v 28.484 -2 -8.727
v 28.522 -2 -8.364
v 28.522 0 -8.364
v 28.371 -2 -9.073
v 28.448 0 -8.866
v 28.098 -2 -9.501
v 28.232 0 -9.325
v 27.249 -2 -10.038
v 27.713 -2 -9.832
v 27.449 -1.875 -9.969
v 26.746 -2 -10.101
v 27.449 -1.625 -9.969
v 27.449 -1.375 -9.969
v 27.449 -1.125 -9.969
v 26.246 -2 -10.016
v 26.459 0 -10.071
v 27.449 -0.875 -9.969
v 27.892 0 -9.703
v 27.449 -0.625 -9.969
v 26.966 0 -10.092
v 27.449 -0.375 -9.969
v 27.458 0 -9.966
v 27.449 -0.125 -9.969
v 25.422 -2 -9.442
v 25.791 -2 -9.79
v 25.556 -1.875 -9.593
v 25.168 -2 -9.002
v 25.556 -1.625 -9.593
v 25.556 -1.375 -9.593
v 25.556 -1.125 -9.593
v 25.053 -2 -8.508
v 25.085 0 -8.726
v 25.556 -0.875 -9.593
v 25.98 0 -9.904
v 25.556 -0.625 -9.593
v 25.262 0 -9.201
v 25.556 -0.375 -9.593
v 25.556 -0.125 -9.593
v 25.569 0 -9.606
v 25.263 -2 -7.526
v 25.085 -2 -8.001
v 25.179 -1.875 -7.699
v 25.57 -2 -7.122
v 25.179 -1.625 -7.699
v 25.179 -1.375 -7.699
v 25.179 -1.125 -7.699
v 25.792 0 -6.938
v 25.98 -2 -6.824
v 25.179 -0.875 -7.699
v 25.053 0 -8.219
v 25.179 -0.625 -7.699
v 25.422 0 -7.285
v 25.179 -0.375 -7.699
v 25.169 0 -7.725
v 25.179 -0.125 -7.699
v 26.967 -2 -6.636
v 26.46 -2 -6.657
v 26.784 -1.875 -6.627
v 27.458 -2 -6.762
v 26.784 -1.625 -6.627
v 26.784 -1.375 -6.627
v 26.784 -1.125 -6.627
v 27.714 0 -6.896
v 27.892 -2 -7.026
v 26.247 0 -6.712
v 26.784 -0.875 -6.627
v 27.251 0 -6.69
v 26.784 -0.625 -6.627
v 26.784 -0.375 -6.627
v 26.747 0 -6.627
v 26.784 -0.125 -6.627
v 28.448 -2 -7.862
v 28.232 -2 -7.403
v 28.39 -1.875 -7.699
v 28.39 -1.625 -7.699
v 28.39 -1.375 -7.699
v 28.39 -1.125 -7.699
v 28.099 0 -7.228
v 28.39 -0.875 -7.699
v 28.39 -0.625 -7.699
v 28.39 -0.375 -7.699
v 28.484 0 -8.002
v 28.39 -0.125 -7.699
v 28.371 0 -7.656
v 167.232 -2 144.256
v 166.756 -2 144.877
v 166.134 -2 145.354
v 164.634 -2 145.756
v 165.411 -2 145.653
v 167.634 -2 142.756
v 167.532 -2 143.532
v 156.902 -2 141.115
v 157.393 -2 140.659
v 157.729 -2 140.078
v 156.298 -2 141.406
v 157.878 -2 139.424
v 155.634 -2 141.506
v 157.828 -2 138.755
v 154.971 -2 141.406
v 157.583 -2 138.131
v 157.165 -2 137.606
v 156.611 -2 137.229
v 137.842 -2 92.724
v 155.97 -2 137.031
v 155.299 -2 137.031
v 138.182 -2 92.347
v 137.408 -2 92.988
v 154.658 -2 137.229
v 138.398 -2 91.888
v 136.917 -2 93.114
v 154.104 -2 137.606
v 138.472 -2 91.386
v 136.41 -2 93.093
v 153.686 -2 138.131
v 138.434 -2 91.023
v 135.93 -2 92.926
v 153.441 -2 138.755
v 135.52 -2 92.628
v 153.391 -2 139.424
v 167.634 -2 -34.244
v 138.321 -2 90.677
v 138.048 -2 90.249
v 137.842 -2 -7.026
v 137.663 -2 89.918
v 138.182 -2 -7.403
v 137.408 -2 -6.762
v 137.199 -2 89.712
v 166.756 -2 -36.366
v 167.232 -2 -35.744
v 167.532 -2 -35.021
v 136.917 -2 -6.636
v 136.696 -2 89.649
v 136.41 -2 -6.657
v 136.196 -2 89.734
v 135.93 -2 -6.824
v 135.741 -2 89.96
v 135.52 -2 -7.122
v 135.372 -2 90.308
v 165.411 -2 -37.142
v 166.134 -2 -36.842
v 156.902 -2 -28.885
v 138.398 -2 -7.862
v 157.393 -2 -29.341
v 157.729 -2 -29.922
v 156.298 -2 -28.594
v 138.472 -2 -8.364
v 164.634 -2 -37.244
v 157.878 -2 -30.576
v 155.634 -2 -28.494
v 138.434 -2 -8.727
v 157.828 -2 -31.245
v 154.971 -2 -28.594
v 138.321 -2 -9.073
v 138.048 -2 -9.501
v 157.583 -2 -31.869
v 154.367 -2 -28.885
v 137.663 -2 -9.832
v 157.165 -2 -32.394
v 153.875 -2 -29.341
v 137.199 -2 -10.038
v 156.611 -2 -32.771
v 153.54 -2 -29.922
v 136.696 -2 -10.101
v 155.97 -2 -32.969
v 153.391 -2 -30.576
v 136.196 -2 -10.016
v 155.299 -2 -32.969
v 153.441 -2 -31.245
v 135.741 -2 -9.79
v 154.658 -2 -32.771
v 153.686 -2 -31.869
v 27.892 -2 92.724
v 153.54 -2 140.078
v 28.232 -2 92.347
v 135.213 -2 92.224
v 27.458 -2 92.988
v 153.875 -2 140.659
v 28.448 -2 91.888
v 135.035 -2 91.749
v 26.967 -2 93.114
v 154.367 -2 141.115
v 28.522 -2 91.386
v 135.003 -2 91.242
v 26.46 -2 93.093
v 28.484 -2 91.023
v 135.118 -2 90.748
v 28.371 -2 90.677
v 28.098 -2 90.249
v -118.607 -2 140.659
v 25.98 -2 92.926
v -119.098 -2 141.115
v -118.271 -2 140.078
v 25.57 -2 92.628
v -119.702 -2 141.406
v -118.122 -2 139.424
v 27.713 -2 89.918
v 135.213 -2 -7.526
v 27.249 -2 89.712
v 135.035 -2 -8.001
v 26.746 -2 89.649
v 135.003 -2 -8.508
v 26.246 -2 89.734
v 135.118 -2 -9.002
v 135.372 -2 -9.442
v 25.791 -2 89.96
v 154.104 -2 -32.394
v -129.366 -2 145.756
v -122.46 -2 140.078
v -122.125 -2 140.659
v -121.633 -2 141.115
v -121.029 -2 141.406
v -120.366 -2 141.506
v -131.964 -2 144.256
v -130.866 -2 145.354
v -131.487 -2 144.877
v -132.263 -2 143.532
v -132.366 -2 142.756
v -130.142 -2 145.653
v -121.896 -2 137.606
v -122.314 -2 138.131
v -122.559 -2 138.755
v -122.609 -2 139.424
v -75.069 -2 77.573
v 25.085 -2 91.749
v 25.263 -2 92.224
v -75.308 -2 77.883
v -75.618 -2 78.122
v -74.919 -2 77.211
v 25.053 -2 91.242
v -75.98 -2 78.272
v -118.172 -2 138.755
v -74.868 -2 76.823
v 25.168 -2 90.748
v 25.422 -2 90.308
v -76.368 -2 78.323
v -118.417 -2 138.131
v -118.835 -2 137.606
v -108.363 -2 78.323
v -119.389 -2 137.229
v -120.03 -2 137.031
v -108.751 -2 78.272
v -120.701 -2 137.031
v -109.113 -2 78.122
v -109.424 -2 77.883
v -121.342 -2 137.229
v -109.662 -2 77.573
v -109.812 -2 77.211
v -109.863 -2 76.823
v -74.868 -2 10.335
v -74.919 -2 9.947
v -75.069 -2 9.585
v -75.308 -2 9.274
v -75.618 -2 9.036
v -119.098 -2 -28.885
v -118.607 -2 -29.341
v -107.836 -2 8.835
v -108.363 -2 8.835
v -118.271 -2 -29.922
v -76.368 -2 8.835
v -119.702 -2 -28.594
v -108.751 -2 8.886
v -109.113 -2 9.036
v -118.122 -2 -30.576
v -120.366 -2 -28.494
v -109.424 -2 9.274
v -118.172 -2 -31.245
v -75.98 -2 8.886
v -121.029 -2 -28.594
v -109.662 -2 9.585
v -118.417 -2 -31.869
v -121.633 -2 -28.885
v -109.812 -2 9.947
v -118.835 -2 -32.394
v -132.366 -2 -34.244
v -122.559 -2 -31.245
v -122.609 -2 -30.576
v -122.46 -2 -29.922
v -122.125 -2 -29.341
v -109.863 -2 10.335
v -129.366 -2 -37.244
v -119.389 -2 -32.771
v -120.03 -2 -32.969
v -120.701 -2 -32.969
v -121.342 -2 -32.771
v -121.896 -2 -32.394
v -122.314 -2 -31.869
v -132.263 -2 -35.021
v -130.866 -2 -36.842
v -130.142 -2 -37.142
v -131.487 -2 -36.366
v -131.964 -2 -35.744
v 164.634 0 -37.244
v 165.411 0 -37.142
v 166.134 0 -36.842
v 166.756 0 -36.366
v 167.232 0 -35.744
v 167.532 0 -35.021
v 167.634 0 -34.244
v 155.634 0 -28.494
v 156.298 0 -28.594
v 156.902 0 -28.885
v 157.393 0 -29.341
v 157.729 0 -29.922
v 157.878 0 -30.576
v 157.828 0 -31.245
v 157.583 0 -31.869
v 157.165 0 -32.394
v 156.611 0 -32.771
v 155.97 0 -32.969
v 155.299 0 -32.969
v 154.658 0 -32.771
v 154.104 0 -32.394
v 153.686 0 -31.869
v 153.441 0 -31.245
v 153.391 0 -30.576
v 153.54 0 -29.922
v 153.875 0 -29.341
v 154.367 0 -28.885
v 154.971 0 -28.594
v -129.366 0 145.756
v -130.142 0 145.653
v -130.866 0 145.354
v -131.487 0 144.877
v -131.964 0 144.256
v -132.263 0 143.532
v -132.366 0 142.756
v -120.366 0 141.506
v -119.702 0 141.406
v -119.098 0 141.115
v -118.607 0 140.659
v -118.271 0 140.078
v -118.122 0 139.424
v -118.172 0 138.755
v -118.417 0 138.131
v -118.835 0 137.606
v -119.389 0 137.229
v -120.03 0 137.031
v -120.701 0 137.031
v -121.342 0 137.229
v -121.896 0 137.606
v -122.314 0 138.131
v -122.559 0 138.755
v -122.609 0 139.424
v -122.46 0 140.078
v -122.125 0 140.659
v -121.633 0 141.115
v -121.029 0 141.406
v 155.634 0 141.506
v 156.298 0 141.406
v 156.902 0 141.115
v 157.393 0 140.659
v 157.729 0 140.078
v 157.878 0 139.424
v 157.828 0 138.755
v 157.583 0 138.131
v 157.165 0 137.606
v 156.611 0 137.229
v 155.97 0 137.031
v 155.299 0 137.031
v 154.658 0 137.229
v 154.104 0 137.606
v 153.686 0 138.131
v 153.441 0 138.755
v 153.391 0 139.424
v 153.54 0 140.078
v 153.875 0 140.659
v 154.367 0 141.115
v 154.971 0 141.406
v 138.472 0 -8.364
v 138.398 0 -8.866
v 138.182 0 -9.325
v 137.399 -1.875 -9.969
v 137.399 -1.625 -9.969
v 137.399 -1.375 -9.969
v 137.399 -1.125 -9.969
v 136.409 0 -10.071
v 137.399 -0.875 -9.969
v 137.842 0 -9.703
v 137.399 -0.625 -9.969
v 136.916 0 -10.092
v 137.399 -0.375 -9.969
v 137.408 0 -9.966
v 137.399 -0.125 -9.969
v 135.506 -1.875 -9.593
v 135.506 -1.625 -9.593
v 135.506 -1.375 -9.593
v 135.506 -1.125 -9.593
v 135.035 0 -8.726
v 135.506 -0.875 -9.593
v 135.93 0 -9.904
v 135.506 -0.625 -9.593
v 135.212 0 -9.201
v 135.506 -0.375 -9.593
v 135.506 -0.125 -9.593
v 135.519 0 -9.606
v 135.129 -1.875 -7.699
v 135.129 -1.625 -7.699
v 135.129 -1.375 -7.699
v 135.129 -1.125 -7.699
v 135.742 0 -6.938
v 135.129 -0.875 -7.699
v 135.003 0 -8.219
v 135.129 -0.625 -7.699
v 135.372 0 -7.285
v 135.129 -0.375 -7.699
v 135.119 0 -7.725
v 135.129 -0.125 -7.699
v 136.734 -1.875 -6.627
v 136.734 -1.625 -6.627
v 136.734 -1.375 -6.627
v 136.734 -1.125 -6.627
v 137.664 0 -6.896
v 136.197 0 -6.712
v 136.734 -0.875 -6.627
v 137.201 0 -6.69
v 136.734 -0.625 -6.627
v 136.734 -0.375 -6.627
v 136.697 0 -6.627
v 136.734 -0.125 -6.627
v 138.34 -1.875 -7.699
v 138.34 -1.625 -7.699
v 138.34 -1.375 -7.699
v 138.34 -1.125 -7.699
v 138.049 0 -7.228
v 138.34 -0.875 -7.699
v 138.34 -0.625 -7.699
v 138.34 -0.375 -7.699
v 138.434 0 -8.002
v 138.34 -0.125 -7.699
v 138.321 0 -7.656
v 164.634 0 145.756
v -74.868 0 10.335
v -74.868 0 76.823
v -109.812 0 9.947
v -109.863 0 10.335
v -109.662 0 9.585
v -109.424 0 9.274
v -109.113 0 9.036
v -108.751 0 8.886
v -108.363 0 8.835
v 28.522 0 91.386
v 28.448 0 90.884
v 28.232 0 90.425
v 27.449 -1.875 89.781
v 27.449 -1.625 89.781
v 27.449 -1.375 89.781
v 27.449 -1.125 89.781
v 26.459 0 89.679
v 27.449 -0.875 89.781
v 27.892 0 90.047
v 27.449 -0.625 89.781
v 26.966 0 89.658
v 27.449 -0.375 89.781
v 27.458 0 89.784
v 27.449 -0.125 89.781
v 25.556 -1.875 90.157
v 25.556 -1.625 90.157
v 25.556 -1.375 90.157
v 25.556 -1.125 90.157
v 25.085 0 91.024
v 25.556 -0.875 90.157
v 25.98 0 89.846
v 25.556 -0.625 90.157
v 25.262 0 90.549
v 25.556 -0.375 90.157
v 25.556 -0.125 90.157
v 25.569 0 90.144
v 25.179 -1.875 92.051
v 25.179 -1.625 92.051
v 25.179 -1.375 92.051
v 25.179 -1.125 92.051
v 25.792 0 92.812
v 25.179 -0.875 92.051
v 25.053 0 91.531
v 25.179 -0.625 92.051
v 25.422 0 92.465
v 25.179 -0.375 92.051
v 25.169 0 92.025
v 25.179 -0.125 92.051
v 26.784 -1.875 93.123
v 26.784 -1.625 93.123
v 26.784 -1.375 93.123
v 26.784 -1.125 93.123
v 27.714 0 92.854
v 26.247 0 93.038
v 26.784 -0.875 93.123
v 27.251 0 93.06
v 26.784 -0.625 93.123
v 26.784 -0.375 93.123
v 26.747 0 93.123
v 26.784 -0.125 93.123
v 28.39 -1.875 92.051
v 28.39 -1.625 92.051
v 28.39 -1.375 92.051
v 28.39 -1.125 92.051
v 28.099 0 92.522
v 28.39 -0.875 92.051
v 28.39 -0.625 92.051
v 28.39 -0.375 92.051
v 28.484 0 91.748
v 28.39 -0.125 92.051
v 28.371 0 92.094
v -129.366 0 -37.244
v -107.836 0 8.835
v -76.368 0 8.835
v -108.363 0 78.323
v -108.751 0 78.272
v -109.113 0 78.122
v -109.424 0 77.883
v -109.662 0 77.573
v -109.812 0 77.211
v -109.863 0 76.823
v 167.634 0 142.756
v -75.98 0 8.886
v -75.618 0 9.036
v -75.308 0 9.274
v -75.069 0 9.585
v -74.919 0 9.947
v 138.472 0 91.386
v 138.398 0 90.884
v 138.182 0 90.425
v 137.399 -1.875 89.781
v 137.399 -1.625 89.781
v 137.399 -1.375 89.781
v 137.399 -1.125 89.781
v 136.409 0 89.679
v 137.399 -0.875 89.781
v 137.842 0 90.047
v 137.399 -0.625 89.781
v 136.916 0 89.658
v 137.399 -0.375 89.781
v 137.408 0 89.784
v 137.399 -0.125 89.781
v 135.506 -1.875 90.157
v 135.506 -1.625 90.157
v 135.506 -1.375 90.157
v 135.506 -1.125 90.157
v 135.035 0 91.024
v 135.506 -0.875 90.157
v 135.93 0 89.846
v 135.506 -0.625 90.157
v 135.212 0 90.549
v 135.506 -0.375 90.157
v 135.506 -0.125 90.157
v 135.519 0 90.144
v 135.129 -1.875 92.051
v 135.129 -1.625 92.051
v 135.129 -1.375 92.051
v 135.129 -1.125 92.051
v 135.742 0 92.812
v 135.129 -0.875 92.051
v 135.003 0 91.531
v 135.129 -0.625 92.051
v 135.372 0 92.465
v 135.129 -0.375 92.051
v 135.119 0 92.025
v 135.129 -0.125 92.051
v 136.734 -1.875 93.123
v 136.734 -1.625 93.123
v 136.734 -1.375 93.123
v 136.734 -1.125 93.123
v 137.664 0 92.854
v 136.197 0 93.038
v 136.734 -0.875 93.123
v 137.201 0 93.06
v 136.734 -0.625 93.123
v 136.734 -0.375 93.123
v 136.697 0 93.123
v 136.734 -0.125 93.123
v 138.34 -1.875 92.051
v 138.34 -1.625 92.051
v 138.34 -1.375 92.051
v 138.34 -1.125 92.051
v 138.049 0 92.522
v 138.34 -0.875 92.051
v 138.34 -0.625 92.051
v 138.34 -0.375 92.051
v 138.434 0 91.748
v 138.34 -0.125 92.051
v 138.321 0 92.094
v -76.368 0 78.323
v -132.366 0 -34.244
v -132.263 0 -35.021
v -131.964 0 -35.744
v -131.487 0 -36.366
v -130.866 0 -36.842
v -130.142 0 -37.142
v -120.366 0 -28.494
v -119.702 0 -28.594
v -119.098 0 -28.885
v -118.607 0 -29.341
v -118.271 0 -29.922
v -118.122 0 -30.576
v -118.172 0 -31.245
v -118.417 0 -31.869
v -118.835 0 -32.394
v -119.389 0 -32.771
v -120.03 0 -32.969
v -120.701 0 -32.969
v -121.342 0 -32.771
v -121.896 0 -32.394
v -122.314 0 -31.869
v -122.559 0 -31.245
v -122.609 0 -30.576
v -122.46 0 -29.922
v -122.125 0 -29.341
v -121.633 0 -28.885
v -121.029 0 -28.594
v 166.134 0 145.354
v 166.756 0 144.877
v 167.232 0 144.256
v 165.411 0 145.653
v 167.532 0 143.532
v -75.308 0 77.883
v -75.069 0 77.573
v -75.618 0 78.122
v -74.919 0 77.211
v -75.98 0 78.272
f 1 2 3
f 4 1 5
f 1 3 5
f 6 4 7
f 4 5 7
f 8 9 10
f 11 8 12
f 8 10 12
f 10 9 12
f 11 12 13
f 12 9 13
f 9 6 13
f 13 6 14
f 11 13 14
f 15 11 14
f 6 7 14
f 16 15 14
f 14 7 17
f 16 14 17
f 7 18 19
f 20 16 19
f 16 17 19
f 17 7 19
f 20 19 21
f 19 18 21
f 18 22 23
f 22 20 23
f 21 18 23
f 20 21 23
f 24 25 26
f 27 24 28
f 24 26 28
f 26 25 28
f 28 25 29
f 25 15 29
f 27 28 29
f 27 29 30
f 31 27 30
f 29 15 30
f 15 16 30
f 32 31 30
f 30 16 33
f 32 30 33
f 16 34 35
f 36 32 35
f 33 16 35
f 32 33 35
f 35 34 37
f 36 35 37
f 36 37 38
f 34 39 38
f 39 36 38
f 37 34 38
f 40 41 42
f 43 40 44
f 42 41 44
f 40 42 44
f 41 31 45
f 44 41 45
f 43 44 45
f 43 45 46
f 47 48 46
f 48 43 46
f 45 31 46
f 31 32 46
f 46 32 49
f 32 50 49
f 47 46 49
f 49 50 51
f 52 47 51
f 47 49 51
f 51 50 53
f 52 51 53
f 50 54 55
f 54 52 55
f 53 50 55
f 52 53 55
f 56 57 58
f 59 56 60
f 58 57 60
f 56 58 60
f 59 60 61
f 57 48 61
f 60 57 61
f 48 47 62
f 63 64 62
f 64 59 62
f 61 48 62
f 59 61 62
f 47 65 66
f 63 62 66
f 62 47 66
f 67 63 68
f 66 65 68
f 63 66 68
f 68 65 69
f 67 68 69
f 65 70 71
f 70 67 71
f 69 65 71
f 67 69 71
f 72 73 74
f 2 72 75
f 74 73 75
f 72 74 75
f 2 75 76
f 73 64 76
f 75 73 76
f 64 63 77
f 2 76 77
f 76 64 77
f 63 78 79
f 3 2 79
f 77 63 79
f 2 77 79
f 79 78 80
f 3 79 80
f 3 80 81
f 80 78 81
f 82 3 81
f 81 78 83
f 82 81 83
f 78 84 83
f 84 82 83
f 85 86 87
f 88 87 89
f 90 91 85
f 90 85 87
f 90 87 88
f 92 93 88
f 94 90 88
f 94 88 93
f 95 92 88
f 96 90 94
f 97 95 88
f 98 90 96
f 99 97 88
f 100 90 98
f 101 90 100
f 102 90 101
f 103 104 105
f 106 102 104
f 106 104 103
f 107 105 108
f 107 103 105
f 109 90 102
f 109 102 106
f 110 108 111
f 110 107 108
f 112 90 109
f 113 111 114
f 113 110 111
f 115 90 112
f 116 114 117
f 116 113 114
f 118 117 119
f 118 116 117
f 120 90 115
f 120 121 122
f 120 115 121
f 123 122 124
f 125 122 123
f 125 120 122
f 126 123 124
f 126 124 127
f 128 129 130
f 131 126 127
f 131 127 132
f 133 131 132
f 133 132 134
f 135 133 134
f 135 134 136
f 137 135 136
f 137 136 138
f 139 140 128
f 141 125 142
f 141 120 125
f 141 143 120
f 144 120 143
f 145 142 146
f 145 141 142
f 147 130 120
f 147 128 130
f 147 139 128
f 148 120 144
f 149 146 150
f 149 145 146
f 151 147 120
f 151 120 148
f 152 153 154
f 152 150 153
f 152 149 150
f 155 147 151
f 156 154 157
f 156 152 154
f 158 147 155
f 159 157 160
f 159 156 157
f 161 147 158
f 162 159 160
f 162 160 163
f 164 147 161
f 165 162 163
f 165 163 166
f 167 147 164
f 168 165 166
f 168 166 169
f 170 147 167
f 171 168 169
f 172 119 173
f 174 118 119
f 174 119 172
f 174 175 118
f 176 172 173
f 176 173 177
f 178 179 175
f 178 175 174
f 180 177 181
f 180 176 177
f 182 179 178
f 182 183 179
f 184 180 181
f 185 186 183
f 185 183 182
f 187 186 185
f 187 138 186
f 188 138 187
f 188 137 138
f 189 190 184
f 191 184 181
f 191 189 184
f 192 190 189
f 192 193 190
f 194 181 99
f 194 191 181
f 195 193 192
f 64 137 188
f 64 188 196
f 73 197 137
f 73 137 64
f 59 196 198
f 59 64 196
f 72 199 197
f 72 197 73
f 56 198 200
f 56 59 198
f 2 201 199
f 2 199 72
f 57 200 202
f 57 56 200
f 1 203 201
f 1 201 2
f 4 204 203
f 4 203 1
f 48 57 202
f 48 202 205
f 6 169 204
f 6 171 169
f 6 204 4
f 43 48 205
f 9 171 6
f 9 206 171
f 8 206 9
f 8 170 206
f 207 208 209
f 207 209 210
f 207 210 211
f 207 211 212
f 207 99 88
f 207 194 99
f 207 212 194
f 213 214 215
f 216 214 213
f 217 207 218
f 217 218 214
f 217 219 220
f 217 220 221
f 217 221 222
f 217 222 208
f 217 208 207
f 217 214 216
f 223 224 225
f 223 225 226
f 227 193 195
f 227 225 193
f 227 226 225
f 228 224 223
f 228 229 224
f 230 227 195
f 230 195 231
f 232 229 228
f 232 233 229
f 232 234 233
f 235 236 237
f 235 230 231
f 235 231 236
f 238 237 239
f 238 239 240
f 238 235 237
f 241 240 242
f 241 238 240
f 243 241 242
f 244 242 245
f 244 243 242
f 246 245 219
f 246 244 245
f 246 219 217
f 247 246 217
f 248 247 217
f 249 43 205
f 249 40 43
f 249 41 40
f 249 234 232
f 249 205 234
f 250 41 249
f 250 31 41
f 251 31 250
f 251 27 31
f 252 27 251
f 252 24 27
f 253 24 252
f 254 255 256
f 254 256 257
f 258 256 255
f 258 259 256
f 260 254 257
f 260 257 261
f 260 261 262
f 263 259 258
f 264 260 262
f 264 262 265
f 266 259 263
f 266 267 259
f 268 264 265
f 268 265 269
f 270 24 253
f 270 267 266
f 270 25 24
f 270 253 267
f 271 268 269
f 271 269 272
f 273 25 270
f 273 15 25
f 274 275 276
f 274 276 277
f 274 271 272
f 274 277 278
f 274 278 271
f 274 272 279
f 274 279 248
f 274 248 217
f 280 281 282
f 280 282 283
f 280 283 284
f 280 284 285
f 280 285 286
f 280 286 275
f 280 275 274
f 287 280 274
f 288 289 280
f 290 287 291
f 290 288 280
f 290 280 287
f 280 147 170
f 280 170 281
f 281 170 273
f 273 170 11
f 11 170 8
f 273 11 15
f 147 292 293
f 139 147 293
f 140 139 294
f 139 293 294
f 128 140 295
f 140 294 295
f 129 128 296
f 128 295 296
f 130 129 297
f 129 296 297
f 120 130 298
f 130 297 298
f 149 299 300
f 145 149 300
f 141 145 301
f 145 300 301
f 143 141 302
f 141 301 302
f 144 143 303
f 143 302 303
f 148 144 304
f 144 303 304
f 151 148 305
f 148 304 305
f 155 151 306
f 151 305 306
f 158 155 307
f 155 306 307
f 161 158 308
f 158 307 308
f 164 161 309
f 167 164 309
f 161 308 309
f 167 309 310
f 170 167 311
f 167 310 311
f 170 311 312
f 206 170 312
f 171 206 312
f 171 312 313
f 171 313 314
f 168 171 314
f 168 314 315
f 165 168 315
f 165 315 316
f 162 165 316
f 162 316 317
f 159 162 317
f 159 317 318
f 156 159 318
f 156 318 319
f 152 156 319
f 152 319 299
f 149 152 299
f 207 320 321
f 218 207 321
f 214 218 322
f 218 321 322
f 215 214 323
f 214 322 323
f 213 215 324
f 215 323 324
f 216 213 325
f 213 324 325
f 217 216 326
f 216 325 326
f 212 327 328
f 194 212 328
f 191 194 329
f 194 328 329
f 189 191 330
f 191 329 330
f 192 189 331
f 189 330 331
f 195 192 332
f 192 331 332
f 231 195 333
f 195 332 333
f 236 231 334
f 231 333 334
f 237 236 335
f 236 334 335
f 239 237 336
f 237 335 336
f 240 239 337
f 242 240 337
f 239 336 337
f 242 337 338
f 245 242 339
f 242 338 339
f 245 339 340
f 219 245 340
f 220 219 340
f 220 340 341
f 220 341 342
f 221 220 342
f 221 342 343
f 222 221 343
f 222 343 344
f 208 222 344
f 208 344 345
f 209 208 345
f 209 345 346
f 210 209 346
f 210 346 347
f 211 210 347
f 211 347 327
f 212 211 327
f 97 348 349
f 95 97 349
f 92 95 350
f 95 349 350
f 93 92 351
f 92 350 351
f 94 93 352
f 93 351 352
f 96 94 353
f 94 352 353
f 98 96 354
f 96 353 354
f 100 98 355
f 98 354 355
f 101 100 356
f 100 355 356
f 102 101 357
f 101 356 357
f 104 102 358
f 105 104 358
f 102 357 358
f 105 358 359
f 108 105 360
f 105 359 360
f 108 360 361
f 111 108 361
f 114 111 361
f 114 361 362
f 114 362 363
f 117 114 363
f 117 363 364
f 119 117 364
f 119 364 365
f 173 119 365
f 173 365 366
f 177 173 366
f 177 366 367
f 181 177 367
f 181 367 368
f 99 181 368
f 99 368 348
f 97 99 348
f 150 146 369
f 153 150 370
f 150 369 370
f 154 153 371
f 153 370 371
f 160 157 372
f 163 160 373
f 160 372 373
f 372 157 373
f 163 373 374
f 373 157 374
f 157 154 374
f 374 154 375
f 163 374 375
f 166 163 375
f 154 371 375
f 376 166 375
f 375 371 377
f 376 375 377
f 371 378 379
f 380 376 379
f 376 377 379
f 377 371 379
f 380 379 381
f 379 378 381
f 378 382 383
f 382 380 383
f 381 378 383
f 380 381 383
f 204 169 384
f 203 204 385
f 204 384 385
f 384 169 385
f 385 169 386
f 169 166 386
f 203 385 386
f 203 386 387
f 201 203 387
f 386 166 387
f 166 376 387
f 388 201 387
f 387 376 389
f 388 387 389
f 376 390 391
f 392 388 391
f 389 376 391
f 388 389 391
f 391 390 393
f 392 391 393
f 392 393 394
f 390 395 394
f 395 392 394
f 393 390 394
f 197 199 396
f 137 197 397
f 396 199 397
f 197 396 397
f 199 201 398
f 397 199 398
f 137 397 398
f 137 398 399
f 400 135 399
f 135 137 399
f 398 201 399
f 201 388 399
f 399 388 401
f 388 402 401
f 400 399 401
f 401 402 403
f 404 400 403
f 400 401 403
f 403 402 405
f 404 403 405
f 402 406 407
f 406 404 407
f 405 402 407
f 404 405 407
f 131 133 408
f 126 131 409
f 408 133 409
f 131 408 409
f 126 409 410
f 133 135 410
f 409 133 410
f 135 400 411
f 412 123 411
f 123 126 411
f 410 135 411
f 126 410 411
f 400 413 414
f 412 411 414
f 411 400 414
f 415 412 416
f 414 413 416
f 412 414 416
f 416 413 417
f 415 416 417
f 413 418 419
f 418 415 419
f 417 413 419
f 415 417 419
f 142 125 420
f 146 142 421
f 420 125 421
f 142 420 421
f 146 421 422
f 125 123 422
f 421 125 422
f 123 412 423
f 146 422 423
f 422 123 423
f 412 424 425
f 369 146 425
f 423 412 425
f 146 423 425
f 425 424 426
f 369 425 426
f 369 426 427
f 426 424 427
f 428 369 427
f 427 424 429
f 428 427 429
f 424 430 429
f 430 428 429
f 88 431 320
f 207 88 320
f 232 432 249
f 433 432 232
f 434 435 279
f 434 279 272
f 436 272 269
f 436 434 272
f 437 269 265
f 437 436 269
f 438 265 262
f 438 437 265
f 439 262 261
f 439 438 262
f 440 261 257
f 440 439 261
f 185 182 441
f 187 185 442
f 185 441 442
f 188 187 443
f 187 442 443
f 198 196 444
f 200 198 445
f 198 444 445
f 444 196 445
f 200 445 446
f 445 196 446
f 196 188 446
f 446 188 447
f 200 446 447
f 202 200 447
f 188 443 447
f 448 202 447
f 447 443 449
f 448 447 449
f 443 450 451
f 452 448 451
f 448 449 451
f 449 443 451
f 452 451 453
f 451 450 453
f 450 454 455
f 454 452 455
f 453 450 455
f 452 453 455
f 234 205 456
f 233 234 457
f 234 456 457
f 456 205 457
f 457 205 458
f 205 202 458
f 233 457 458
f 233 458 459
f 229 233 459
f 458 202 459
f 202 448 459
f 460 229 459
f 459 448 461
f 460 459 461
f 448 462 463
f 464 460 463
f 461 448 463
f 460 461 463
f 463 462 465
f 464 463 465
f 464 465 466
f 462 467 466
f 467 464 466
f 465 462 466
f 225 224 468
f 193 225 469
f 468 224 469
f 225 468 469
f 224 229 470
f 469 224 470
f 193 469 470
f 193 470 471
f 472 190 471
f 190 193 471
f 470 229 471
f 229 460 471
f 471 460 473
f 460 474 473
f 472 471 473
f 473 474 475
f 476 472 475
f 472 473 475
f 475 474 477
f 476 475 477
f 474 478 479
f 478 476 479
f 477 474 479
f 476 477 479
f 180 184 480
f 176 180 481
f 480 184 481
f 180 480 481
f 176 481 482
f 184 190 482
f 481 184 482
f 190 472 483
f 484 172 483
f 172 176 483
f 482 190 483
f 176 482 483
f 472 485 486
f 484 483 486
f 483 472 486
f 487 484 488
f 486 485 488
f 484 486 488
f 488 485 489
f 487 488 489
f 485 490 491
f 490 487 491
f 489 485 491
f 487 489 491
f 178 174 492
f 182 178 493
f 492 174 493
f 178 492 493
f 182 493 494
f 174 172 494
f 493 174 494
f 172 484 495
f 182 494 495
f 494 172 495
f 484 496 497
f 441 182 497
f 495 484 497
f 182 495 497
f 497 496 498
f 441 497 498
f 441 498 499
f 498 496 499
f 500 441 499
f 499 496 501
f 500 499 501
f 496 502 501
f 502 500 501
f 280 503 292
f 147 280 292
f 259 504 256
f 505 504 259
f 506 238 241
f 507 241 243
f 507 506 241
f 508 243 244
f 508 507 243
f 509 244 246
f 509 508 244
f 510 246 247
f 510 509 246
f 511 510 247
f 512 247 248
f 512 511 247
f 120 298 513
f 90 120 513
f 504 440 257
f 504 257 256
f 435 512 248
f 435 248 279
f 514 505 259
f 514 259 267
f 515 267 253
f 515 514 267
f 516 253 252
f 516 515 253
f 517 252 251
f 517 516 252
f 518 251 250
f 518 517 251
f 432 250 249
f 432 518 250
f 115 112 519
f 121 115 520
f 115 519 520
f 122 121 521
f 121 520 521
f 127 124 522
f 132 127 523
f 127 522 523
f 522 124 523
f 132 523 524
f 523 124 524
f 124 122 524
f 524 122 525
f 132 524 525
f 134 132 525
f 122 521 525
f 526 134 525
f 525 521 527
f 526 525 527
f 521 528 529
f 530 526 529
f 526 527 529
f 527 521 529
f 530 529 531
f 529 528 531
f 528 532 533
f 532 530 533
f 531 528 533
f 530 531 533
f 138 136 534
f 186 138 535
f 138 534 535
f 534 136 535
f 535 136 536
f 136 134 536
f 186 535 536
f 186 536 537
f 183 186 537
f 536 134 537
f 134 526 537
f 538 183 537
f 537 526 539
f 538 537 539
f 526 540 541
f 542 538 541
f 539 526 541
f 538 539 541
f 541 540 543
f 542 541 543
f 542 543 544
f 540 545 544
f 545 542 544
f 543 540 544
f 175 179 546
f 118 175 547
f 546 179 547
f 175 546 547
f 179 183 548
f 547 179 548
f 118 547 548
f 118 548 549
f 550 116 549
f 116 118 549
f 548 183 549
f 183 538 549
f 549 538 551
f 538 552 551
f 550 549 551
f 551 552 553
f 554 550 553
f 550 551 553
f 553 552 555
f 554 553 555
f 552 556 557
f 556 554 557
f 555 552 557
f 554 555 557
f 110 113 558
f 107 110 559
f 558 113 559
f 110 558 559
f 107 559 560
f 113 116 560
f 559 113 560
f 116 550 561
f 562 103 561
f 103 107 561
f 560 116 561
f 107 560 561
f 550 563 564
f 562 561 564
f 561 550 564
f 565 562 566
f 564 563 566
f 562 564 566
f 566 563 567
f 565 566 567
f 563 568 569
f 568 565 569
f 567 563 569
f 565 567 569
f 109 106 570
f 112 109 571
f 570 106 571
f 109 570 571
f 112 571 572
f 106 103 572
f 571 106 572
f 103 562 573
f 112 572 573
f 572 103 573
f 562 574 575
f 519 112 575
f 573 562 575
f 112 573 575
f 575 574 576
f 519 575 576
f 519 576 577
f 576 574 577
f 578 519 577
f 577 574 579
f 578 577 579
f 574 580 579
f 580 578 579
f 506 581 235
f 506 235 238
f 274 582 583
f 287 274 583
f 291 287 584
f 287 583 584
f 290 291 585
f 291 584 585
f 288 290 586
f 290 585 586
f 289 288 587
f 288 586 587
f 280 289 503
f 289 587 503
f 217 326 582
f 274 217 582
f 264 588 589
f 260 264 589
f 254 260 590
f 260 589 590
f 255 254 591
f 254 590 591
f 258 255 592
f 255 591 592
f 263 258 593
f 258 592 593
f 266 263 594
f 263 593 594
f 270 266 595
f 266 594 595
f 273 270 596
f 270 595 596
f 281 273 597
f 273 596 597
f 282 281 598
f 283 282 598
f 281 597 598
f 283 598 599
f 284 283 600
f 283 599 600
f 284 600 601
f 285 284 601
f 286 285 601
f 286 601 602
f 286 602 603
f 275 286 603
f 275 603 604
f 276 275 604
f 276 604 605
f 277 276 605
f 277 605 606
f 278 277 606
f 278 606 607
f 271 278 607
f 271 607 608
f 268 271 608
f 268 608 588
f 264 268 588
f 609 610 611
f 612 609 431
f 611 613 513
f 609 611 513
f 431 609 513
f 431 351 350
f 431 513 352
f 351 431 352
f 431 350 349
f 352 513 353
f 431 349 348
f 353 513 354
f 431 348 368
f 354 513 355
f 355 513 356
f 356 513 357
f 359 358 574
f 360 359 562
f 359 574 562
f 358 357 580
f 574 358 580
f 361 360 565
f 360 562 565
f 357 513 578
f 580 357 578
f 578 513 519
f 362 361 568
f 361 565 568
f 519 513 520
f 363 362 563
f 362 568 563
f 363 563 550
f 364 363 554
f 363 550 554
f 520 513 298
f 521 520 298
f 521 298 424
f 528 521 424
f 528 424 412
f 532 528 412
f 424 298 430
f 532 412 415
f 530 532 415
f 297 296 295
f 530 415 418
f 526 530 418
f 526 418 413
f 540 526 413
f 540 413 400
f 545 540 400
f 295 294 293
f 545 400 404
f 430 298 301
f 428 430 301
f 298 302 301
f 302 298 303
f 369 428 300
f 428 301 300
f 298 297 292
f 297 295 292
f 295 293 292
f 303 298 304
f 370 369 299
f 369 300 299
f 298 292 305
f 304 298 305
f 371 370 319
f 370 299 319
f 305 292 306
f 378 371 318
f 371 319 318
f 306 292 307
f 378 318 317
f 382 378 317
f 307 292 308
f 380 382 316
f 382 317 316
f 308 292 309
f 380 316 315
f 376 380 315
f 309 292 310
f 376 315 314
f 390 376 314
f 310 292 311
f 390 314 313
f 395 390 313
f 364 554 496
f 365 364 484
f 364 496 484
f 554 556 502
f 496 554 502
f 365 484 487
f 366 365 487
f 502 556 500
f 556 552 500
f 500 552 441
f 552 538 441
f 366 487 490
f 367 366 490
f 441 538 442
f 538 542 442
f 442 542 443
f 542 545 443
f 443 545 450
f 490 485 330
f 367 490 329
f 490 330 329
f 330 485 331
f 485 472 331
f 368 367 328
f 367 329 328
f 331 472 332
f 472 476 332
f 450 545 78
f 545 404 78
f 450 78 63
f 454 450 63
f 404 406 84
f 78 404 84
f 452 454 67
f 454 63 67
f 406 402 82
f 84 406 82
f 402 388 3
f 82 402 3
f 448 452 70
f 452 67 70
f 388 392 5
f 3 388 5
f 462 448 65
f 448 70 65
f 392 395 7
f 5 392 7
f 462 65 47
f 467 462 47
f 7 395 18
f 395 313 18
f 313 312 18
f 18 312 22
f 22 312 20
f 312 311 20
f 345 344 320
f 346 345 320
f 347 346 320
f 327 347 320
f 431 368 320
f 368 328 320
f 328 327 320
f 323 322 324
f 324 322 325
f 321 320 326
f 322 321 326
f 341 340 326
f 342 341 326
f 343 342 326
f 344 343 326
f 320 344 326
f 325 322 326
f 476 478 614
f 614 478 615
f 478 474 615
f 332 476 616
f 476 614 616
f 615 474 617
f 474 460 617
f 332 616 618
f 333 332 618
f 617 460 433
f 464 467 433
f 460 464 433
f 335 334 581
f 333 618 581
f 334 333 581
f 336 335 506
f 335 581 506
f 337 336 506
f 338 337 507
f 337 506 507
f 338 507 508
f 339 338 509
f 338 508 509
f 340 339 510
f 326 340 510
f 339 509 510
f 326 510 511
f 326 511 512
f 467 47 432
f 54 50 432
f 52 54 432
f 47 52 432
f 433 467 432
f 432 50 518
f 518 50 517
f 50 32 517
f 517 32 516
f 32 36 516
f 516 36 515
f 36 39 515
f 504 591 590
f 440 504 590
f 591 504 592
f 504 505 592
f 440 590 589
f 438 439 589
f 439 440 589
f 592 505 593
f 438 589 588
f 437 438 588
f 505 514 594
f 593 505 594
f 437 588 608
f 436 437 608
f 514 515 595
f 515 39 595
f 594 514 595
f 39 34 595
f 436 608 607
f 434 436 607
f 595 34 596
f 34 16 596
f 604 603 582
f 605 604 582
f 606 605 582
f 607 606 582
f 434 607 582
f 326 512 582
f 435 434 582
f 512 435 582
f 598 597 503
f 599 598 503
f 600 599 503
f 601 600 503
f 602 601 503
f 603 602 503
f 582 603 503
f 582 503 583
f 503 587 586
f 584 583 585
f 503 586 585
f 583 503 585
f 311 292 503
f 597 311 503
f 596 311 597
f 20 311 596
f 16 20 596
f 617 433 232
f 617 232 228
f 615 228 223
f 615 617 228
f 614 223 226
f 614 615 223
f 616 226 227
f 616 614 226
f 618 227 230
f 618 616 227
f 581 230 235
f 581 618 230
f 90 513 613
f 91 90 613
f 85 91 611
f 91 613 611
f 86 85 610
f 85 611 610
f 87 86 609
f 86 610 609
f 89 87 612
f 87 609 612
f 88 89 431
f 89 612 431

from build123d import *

# Parameters (mm, degrees)
BASE_FLANGE2_DEPTH = 2
SKETCH2_R          = 2.25
CUT_EXTRUDE4_DEPTH = 10
CUT_EXTRUDE3_DEPTH = 10
CUT_EXTRUDE5_DEPTH = 10


# Sheet-metal steps are written as plain solids
with BuildPart() as part:
    # Sketch1 → Base-Flange2 (new body)
    with BuildSketch(Plane(origin=(0, 0, 0), x_dir=(1, 0, 0), z_dir=(0, 1, 0))):
        with BuildLine():
            Line((164.634355994, -145.755690278), (-129.365644006, -145.755690278))
            ThreePointArc((-129.365644006, -145.755690278), (-131.486964349, -144.877010621), (-132.365644006, -142.755690278))
            Line((-132.365644006, -142.755690278), (-132.365644006, 34.244309722))
            ThreePointArc((-132.365644006, 34.244309722), (-131.486964349, 36.365630066), (-129.365644006, 37.244309722))
            Line((-129.365644006, 37.244309722), (164.634355994, 37.244309722))
            ThreePointArc((164.634355994, 37.244309722), (166.755676338, 36.365630066), (167.634355994, 34.244309722))
            Line((167.634355994, 34.244309722), (167.634355994, -142.755690278))
            ThreePointArc((167.634355994, -142.755690278), (166.755676338, -144.877010621), (164.634355994, -145.755690278))
        make_face()
    extrude(amount=-BASE_FLANGE2_DEPTH)

    # Sketch2 → Cut-Extrude4 (cut)
    with BuildSketch(Plane(origin=(0, 0, 0), x_dir=(1, 0, 0), z_dir=(0, 1, 0))):
        with Locations(Location((-120.365644006, 30.744309722, 0), (0, 0, 270))):
            Circle(SKETCH2_R)
        with Locations(Location((-120.365644006, -139.255690278, 0), (0, 0, 270))):
            Circle(SKETCH2_R)
        with Locations(Location((155.634355994, -139.255690278, 0), (0, 0, 270))):
            Circle(SKETCH2_R)
        with Locations(Location((155.634355994, 30.744309722, 0), (0, 0, 270))):
            Circle(SKETCH2_R)
    extrude(amount=-CUT_EXTRUDE4_DEPTH, mode=Mode.SUBTRACT)

    # Sketch3 → Cut-Extrude3 (cut)
    with BuildSketch(Plane(origin=(0, 0, 0), x_dir=(1, 0, 0), z_dir=(0, 1, 0))):
        with BuildLine():
            Line((-107.836218664, -8.834875742), (-76.368346069, -8.834873742))
            ThreePointArc((-76.368346069, -8.834873742), (-75.307684442, -9.274214133), (-74.868344006, -10.334875742))
            Line((-74.868344006, -10.334875742), (-74.868344006, -76.822675742))
            ThreePointArc((-74.868344006, -76.822675742), (-75.307683834, -77.883335913), (-76.368344006, -78.322675742))
            Line((-76.368344006, -78.322675742), (-76.895069411, -78.322675742))
            Line((-76.895069411, -78.322675742), (-107.836218601, -78.322675742))
            Line((-107.836218601, -78.322675742), (-108.362944006, -78.322675742))
            ThreePointArc((-108.362944006, -78.322675742), (-109.423604177, -77.883335913), (-109.862944006, -76.822675742))
            Line((-109.862944006, -76.822675742), (-109.862944006, -10.334875742))
            ThreePointArc((-109.862944006, -10.334875742), (-109.423604177, -9.27421557), (-108.362944006, -8.834875742))
            Line((-108.362944006, -8.834875742), (-107.836218664, -8.834875742))
        make_face()
    extrude(amount=-CUT_EXTRUDE3_DEPTH, mode=Mode.SUBTRACT)

    # Sketch6 → Cut-Extrude5 (cut)
    with BuildSketch(Plane(origin=(0, 0, 0), x_dir=(1, 0, 0), z_dir=(0, 1, 0))):
        with BuildLine():
            add(Edge.make_bspline(
                [(28.521903533, -91.386017736), (28.521903533, -91.158613657), (28.431436566, -90.7038055), (28.044994377, -90.125453892), (27.466642769, -89.739011703), (26.784430533, -89.603311252), (26.102218297, -89.739011703), (25.52386669, -90.125453892), (25.1374245, -90.7038055), (25.00172405, -91.386017736), (25.1374245, -92.068229972), (25.52386669, -92.646581579), (26.102218297, -93.033023768), (26.784430533, -93.168724219), (27.466642769, -93.033023768), (28.044994377, -92.646581579), (28.431436566, -92.068229972), (28.521903533, -91.613421814), (28.521903533, -91.386017736)],
                knots=[0, 0, 0, 0, 0.0625, 0.125, 0.1875, 0.25, 0.3125, 0.375, 0.4375, 0.5, 0.5625, 0.625, 0.6875, 0.75, 0.8125, 0.875, 0.9375, 1, 1, 1, 1], degree=3))
        make_face()
        with BuildLine():
            add(Edge.make_bspline(
                [(138.471903533, 8.363982264), (138.471903533, 8.591386343), (138.381436566, 9.0461945), (137.994994377, 9.624546108), (137.416642769, 10.010988297), (136.734430533, 10.146688748), (136.052218297, 10.010988297), (135.47386669, 9.624546108), (135.0874245, 9.0461945), (134.95172405, 8.363982264), (135.0874245, 7.681770028), (135.47386669, 7.103418421), (136.052218297, 6.716976232), (136.734430533, 6.581275781), (137.416642769, 6.716976232), (137.994994377, 7.103418421), (138.381436566, 7.681770028), (138.471903533, 8.136578186), (138.471903533, 8.363982264)],
                knots=[0, 0, 0, 0, 0.0625, 0.125, 0.1875, 0.25, 0.3125, 0.375, 0.4375, 0.5, 0.5625, 0.625, 0.6875, 0.75, 0.8125, 0.875, 0.9375, 1, 1, 1, 1], degree=3))
        make_face()
        with BuildLine():
            add(Edge.make_bspline(
                [(28.521903533, 8.363982264), (28.521903533, 8.591386343), (28.431436566, 9.0461945), (28.044994377, 9.624546108), (27.466642769, 10.010988297), (26.784430533, 10.146688748), (26.102218297, 10.010988297), (25.52386669, 9.624546108), (25.1374245, 9.0461945), (25.00172405, 8.363982264), (25.1374245, 7.681770028), (25.52386669, 7.103418421), (26.102218297, 6.716976232), (26.784430533, 6.581275781), (27.466642769, 6.716976232), (28.044994377, 7.103418421), (28.431436566, 7.681770028), (28.521903533, 8.136578186), (28.521903533, 8.363982264)],
                knots=[0, 0, 0, 0, 0.0625, 0.125, 0.1875, 0.25, 0.3125, 0.375, 0.4375, 0.5, 0.5625, 0.625, 0.6875, 0.75, 0.8125, 0.875, 0.9375, 1, 1, 1, 1], degree=3))
        make_face()
        with BuildLine():
            add(Edge.make_bspline(
                [(138.471903533, -91.386017736), (138.471903533, -91.158613657), (138.381436566, -90.7038055), (137.994994377, -90.125453892), (137.416642769, -89.739011703), (136.734430533, -89.603311252), (136.052218297, -89.739011703), (135.47386669, -90.125453892), (135.0874245, -90.7038055), (134.95172405, -91.386017736), (135.0874245, -92.068229972), (135.47386669, -92.646581579), (136.052218297, -93.033023768), (136.734430533, -93.168724219), (137.416642769, -93.033023768), (137.994994377, -92.646581579), (138.381436566, -92.068229972), (138.471903533, -91.613421814), (138.471903533, -91.386017736)],
                knots=[0, 0, 0, 0, 0.0625, 0.125, 0.1875, 0.25, 0.3125, 0.375, 0.4375, 0.5, 0.5625, 0.625, 0.6875, 0.75, 0.8125, 0.875, 0.9375, 1, 1, 1, 1], degree=3))
        make_face()
    extrude(amount=-CUT_EXTRUDE5_DEPTH, mode=Mode.SUBTRACT)


solid = part.part
